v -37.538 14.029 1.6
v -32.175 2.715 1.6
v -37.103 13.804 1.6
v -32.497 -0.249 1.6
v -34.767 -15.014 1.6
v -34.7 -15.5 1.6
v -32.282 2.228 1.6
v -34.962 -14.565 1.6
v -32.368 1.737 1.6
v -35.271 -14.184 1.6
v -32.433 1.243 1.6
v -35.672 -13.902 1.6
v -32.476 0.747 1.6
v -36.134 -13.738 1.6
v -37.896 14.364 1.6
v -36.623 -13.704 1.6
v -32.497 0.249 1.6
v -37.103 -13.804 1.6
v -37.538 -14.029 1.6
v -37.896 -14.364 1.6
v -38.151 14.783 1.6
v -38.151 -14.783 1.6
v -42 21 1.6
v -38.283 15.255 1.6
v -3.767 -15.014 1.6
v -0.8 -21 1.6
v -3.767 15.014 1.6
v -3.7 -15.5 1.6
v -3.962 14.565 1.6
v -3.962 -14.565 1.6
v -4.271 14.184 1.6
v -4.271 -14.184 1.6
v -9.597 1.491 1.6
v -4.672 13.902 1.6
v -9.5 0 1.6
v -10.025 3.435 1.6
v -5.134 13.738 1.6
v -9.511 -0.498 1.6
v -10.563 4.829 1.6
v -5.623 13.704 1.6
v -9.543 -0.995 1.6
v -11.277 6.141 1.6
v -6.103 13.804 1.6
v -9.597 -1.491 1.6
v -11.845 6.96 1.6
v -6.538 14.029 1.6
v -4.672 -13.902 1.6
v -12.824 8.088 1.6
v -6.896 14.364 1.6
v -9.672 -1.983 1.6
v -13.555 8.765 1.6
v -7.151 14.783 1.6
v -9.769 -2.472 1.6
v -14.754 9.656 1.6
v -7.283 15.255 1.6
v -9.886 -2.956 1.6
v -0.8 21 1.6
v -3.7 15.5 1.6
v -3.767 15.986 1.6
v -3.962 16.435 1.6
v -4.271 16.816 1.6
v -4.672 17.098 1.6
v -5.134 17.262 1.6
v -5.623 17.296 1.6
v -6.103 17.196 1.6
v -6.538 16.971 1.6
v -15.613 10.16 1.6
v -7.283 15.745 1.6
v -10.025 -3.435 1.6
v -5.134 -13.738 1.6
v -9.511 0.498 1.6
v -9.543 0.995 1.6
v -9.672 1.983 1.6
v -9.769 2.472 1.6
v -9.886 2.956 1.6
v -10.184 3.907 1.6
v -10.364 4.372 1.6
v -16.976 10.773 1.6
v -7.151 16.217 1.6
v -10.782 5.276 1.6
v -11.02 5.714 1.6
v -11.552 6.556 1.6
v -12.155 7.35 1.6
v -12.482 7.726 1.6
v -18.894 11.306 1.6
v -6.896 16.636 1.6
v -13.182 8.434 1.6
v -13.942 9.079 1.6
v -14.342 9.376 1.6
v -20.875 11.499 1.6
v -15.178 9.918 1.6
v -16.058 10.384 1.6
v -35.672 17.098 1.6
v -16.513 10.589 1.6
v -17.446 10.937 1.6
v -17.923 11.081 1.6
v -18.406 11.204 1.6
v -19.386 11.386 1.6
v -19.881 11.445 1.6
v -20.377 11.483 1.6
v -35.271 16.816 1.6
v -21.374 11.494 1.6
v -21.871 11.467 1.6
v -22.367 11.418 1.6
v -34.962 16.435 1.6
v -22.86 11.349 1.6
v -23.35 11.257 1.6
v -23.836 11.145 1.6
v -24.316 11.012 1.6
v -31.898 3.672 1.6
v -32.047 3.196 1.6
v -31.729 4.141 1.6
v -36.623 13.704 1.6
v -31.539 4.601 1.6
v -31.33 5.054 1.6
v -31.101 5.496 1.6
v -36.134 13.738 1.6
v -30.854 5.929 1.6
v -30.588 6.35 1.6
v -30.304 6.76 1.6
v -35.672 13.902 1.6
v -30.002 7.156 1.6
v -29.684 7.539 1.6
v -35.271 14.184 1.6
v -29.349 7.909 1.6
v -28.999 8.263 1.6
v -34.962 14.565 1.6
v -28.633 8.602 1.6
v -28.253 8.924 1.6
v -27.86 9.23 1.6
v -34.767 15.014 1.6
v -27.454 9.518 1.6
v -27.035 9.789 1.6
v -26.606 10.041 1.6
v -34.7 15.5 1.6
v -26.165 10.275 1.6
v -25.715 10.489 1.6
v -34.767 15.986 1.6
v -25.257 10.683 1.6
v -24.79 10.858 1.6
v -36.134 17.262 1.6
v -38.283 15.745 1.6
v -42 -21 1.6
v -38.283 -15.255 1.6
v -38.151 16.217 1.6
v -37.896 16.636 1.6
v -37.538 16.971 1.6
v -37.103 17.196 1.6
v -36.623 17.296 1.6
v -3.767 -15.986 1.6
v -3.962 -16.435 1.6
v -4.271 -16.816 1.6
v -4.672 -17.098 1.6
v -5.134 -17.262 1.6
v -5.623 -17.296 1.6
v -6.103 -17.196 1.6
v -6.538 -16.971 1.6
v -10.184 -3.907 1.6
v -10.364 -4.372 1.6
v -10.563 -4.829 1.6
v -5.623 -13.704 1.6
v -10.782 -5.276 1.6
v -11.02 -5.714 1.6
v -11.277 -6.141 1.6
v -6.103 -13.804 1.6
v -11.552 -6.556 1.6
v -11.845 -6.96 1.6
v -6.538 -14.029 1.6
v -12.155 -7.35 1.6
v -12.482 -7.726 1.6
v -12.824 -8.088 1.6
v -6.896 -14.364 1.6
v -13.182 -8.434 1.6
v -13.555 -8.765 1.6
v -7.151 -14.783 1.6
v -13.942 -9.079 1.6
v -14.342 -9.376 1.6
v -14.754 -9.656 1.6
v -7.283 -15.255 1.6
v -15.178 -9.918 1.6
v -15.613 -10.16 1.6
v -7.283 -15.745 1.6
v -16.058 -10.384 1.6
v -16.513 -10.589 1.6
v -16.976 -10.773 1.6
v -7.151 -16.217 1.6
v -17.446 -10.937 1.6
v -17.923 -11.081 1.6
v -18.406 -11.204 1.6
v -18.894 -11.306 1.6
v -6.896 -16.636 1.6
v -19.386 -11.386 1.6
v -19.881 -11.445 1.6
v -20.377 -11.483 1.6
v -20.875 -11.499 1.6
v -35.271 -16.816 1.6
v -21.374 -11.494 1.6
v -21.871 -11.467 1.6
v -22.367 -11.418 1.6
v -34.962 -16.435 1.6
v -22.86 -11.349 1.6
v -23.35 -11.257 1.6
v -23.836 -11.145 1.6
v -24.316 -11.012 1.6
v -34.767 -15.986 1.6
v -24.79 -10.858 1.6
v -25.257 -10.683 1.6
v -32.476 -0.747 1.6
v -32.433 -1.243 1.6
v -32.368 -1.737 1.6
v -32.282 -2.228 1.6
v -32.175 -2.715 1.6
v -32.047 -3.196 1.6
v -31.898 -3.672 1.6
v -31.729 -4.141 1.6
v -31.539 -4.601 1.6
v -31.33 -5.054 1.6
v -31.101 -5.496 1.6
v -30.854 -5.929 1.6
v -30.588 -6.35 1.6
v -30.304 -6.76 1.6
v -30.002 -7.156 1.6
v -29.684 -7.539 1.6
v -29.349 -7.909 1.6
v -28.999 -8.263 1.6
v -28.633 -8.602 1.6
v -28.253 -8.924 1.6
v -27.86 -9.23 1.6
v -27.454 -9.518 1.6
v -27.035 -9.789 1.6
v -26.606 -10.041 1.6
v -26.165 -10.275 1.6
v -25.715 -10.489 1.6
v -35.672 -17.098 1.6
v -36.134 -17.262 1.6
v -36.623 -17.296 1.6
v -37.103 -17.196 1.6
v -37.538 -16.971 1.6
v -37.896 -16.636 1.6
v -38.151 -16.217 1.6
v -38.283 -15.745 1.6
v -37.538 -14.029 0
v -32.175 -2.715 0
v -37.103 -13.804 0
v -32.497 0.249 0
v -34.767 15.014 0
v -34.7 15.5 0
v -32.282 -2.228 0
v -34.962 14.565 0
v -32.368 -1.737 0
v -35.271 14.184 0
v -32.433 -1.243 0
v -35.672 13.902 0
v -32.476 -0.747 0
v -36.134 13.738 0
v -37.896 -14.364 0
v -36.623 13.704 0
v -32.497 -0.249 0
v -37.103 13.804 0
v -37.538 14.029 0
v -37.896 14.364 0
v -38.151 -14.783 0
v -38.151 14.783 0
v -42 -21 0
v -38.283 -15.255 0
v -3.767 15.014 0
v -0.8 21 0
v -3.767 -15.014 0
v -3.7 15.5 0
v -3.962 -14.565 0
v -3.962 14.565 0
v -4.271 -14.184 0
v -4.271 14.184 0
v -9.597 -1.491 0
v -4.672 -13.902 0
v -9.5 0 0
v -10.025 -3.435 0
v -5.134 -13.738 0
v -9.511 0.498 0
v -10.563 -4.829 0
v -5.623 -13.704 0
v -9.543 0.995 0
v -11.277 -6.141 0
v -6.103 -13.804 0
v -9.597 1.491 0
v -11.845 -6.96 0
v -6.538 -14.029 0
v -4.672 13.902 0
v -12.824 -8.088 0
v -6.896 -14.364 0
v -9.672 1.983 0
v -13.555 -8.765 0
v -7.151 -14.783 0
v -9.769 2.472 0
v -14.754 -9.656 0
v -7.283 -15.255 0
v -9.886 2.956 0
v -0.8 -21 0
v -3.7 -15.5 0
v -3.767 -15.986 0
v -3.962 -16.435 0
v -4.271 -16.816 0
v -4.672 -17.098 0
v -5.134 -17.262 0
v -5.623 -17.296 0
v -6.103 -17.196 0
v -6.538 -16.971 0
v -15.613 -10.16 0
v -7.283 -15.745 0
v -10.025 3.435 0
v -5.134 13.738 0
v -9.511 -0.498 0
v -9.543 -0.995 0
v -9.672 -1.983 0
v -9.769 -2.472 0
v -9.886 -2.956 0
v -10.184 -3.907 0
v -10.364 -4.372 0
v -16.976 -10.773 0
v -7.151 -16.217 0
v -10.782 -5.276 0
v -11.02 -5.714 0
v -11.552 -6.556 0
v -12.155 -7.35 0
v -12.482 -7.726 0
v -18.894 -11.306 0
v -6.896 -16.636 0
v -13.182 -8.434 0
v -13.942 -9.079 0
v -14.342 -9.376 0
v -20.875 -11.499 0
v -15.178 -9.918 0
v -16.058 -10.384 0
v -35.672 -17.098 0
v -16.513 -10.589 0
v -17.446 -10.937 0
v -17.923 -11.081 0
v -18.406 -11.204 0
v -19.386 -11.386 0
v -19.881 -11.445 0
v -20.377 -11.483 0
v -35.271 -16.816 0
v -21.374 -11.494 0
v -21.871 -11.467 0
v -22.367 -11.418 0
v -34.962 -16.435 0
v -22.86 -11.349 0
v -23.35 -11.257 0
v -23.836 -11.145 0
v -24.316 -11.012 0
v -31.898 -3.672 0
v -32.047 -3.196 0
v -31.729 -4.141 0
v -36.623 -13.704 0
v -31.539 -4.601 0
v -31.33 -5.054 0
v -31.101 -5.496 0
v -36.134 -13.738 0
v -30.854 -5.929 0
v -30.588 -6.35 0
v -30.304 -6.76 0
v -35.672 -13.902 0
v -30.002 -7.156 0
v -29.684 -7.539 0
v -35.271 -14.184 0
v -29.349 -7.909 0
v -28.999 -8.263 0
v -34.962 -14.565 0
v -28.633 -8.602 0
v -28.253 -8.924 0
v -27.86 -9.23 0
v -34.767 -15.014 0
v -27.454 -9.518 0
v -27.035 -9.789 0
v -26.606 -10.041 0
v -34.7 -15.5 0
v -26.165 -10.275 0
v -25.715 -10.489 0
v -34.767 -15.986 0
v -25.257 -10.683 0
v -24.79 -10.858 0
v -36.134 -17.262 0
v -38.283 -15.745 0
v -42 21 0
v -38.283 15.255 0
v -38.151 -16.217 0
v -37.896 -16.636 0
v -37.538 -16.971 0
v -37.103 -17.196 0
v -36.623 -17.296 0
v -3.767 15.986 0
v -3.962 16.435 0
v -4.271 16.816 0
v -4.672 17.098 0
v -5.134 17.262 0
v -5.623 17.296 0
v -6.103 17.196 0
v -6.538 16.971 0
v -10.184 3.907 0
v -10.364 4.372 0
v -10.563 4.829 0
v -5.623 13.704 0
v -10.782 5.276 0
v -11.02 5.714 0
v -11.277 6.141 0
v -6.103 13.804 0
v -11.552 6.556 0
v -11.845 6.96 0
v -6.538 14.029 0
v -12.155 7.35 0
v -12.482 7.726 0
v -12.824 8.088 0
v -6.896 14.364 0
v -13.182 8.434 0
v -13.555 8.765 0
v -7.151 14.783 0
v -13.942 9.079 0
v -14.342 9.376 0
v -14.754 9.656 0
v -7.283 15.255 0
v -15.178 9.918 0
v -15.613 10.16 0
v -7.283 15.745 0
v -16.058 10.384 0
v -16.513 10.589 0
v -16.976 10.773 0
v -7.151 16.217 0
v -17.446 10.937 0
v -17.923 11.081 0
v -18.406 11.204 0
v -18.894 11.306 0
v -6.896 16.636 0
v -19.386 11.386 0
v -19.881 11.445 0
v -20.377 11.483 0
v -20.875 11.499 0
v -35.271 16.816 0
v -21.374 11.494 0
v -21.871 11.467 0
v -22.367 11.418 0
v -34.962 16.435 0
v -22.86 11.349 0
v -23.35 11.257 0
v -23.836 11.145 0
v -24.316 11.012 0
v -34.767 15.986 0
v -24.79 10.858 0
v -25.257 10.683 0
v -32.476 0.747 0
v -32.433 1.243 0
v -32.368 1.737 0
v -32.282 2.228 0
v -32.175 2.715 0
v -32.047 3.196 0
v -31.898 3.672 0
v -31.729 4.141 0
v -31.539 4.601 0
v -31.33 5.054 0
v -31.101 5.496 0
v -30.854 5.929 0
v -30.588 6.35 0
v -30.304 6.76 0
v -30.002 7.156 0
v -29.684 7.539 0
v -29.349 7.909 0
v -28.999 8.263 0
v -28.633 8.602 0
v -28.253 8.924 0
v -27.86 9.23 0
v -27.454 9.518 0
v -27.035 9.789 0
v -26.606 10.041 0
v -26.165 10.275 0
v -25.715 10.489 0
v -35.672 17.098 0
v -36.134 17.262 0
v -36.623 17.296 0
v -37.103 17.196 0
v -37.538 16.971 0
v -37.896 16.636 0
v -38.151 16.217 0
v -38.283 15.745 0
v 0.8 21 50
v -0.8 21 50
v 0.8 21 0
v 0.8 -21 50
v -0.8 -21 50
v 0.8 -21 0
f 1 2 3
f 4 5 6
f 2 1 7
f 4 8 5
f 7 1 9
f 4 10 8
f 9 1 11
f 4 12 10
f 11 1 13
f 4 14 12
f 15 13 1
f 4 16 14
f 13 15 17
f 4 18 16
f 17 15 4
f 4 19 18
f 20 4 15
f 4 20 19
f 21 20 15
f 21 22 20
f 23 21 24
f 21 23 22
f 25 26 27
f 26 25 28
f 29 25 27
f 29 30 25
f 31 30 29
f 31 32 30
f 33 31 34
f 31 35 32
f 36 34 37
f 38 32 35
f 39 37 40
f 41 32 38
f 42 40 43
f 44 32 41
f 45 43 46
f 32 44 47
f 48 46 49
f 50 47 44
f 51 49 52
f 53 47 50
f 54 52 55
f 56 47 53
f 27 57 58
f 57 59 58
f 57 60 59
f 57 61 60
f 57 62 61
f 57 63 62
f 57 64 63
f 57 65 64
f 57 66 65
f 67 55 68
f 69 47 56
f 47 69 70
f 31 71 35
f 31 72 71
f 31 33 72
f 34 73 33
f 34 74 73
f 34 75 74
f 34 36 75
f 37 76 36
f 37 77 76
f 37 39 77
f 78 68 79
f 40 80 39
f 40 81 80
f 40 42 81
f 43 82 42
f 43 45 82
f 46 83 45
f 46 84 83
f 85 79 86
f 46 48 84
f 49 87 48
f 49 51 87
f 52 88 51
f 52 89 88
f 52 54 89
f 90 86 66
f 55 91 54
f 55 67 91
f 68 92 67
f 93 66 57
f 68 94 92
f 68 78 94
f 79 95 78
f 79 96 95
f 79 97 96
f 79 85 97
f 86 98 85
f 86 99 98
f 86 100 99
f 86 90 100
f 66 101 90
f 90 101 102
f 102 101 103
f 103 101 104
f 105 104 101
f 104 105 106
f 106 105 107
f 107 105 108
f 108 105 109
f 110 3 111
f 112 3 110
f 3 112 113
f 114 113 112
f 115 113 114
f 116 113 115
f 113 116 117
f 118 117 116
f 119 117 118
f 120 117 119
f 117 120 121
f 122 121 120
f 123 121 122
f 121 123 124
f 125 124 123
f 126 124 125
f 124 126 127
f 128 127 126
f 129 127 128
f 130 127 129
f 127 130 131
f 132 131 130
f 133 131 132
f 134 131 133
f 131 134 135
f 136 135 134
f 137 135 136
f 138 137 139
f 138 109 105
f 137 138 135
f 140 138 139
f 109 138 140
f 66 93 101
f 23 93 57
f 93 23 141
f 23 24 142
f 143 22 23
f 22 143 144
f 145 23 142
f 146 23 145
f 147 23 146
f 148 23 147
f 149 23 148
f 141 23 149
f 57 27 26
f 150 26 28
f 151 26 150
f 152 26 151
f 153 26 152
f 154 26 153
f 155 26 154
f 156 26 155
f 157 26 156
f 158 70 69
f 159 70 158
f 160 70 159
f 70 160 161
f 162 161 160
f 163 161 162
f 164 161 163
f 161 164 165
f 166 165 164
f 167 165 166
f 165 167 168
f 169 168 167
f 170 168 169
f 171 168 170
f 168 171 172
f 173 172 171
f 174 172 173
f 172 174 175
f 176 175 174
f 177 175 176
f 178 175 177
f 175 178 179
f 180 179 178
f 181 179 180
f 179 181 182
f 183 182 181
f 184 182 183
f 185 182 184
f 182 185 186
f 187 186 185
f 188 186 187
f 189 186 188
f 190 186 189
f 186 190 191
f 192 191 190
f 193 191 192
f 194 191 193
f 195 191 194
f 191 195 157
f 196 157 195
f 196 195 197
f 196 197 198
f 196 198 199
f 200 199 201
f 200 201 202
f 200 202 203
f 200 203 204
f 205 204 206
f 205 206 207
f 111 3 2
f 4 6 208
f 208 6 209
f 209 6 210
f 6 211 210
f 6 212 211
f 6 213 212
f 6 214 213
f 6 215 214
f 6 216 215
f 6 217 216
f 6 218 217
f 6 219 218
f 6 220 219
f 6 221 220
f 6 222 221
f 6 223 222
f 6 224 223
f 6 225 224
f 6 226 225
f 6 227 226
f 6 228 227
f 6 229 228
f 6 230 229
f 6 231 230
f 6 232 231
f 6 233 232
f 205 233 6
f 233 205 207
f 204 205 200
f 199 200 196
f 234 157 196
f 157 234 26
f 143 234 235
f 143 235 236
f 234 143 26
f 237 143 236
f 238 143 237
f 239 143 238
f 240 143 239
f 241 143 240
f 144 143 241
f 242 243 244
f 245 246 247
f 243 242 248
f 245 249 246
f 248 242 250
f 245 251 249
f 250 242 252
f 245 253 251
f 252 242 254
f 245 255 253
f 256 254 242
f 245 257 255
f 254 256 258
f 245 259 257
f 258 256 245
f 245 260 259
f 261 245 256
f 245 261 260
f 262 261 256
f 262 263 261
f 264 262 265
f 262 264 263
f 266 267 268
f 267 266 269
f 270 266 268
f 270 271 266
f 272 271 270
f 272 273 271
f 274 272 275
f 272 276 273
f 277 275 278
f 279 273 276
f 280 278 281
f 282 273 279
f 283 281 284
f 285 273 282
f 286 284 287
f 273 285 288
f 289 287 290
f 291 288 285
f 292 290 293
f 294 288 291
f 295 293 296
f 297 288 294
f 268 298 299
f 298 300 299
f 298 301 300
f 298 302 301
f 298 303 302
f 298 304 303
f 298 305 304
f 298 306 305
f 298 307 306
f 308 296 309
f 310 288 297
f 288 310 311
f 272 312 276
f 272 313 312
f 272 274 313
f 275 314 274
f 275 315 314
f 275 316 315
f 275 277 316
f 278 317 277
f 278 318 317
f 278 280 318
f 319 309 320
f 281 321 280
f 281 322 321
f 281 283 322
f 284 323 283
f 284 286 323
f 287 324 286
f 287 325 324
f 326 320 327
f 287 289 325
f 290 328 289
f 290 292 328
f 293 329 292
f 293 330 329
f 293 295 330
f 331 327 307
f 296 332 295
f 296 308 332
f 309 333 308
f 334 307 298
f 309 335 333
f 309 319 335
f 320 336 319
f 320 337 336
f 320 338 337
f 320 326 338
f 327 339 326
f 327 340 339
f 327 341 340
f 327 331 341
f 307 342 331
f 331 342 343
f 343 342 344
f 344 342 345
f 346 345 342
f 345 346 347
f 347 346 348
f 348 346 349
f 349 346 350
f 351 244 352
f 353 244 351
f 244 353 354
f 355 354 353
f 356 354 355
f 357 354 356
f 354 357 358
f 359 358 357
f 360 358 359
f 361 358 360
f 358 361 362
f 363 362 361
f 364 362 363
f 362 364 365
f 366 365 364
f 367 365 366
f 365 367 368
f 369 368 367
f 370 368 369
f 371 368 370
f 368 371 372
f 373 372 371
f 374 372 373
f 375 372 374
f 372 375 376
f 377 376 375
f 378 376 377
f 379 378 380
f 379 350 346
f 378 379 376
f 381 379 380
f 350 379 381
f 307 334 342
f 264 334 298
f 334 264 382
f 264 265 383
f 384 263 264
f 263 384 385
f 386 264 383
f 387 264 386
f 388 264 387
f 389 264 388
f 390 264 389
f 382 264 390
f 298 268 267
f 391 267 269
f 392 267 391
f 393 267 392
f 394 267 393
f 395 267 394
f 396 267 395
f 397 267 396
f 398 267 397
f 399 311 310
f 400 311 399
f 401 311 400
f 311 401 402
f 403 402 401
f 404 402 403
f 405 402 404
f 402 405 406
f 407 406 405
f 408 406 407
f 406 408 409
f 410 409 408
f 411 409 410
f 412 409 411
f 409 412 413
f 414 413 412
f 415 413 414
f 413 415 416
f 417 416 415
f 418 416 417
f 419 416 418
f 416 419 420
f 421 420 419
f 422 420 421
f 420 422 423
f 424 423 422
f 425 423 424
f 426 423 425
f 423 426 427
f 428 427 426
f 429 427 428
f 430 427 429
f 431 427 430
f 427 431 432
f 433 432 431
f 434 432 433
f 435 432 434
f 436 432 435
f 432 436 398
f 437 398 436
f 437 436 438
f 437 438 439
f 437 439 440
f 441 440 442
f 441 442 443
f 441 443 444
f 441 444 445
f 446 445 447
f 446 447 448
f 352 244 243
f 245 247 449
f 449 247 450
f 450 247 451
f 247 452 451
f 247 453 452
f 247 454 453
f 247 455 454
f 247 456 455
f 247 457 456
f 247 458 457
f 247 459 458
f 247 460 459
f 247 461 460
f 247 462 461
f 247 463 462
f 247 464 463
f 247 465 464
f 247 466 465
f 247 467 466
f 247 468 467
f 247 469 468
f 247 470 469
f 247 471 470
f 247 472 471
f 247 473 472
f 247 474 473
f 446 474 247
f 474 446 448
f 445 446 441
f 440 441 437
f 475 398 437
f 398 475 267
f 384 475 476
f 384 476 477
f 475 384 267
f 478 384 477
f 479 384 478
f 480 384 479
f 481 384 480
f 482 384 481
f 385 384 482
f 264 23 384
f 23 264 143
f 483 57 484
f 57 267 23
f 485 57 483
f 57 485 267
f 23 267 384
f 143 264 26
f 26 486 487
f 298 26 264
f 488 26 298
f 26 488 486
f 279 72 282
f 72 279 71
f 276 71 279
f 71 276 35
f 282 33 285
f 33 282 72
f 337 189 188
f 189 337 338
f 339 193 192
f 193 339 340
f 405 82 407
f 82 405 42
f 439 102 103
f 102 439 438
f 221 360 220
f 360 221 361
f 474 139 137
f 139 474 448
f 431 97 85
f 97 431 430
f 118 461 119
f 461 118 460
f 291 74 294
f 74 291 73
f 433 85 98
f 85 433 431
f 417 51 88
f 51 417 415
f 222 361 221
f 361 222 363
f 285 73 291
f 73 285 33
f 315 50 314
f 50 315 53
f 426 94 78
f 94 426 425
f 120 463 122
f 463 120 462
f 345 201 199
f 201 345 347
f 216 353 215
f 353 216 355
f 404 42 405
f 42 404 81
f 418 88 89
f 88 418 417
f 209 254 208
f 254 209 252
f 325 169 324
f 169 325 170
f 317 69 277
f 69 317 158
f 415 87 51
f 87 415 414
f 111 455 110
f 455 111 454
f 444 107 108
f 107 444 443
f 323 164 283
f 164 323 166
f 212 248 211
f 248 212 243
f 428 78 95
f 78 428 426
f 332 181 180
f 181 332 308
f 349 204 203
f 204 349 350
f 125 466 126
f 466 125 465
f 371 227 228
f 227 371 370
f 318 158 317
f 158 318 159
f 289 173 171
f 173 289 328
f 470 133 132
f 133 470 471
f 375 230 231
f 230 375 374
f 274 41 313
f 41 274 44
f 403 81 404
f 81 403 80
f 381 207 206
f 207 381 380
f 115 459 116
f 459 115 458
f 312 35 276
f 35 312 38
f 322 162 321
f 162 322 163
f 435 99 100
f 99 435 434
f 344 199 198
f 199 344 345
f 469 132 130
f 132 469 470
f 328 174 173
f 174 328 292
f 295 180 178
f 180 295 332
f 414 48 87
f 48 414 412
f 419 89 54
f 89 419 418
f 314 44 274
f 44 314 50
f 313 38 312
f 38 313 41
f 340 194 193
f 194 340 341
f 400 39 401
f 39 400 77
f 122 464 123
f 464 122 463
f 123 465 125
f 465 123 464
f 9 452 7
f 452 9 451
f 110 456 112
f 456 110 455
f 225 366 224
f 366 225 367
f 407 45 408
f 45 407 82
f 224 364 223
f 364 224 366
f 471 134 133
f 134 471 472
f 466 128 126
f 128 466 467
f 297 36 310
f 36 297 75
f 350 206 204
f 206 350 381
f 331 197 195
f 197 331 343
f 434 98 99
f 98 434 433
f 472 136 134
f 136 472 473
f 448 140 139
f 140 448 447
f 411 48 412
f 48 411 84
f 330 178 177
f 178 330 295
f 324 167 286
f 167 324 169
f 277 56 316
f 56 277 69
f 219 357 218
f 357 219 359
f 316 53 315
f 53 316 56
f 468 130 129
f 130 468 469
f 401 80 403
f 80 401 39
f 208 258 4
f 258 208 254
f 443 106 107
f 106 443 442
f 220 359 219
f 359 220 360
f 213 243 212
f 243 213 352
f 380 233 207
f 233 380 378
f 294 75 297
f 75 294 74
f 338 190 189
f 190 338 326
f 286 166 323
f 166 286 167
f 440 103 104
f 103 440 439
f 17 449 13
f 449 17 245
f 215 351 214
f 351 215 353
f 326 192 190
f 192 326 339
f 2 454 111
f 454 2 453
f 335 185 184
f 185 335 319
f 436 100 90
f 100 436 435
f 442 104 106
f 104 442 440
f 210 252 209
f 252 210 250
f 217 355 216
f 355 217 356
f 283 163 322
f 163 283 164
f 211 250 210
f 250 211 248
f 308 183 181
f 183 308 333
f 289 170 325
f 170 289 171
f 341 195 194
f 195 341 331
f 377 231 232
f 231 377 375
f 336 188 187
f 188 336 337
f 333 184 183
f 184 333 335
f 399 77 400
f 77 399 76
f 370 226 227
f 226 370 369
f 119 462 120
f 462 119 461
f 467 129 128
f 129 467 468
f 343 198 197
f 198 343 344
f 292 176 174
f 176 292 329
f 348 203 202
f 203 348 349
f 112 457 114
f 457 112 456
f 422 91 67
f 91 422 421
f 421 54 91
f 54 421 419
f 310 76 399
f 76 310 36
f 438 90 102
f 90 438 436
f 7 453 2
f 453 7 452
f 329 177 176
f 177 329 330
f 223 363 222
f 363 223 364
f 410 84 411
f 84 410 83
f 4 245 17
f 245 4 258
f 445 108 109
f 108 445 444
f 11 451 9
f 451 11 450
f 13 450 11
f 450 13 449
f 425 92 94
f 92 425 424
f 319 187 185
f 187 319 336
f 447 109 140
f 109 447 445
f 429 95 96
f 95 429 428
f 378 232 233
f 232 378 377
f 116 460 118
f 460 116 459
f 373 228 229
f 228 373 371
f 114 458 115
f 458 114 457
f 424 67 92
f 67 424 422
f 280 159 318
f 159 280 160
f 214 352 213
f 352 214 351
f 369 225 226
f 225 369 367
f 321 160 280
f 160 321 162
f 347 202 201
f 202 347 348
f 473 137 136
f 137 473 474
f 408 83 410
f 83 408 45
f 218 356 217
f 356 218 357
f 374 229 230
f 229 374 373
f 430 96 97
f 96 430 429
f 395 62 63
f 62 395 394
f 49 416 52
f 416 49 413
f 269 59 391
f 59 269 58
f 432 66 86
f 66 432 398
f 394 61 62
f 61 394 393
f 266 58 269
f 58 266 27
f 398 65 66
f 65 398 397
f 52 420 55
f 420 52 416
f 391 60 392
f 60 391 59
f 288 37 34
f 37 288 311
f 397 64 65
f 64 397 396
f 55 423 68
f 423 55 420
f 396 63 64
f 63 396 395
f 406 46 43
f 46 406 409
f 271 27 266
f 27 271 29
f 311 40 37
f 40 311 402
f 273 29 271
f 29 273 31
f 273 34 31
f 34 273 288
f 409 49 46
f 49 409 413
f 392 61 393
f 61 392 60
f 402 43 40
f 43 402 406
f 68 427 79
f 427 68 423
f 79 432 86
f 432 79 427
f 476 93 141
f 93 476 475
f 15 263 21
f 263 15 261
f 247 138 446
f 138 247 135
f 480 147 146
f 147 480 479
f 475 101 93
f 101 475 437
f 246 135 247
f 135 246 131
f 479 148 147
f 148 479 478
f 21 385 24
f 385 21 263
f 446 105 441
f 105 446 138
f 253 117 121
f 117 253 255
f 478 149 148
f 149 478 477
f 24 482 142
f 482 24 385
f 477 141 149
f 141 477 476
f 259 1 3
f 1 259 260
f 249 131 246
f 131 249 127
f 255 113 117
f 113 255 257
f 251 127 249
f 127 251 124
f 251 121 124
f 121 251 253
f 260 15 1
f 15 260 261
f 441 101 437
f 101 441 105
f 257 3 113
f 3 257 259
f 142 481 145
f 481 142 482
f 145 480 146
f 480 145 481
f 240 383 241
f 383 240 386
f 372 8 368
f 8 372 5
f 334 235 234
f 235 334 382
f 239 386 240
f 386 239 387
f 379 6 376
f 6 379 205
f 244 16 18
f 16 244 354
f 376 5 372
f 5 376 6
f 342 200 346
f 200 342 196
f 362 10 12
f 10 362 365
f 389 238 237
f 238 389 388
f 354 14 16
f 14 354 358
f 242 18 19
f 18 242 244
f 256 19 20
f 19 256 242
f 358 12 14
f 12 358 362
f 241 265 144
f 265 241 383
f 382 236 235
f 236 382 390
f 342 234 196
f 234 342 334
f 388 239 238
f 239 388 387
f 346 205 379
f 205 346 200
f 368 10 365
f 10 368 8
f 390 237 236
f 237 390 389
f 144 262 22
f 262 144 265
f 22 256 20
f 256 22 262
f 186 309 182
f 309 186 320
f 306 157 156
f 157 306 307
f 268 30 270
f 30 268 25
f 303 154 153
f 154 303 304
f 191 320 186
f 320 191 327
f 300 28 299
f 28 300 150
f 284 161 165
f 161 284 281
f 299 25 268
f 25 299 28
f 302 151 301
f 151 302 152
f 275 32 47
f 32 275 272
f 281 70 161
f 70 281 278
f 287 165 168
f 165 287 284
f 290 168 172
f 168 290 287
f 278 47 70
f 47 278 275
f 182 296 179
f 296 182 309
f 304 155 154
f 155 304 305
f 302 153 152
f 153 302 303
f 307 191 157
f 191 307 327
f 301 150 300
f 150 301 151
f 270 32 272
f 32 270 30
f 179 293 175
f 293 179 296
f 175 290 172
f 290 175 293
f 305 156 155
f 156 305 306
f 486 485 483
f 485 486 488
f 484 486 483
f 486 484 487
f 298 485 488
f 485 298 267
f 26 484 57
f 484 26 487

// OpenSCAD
//design and code by emanresu (http://www.thingiverse.com/Emanresu)
//generates clampable mounts for a NEMA 17 syle stepper motor



//CUSTOMIZER VARIABLES

//Clamp Type
type = "90 degree";//[90 degree, 180 degree, 45 degree, Multi]
//Clamp Thickness (mm)
thick = 1.6;
//Shaft height (mm)
shaft_height = 21;// 21:10000000
//width of clamp base (mm);
width=42; //42:10000000
//do you want the motor plate the same width as the clamp?
mount_flush="yes";//[yes,no]
//how do you want the motor mount justified with respect to the clamp?
//length of 90º base of clamp (mm)
base_1 = 50;
//length of 180º or 45º base of clamp (mm)
base_2 = 30;
//length of 180º base in multi-clamp (mm)
base_3 = 30;


/* [Hidden] */

//Sets openSCAD resolution for nice round holes
$fa=1;
$fs=0.5;

//NEMA 17 Parameters
Nema_square = 42;
Nema_hole_offset = 31;
Nema_mount_hole_diameter = 3.6;//clearance for M3 screws
Nema_center_hole_diameter = 23;

Nema_mount_hole_radius = Nema_mount_hole_diameter/2;
Nema_center_hole_radius = Nema_center_hole_diameter/2;


   ///////////////
  //  Modules  //
 ///////////////

module NEMA17_plate() {
	// Generates mounting plate  with the necessary clearance holes for a NEMA 17 style motor
	
	difference() {
		//plate body
		cube(size=[Nema_square, Nema_square, thick], center=true);
		
		//center hole
		cylinder(r=Nema_center_hole_radius, h=thick+2, center=true);
		
		//clearance holes for M3 screws
		translate([Nema_hole_offset/2, Nema_hole_offset/2, 0]) {
			cylinder(r=Nema_mount_hole_radius, h=thick+1, center=true);
		} 
		translate([-Nema_hole_offset/2, Nema_hole_offset/2, 0]) {
			cylinder(r=Nema_mount_hole_radius, h=thick+1, center=true);
		}
		translate([-Nema_hole_offset/2, -Nema_hole_offset/2, 0]) {
			cylinder(r=Nema_mount_hole_radius, h=thick+1, center=true);
		}
		translate([Nema_hole_offset/2, -Nema_hole_offset/2, 0]) {
			cylinder(r=Nema_mount_hole_radius, h=thick+1, center=true);
		}
	}
}


module 90deg_clamp() {
	// makes a simple 90º clamp for a NEMA 17 style motor
	
	//defines spacer for shaft_height parameter
	//sets minimum value allowed for shaft height
	delta = (shaft_height >= 21 ? abs(shaft_height-Nema_square/2) : 0);
	
	//sets minimum value allowed for the base width
	base_width = (width - Nema_square > 0 ? width : Nema_square);
	
	//determines if mount plate is flush with the rest of the clamp
	test_width = (mount_flush == "yes" ? (abs(width-Nema_square)/2) : 0);
	ex_width = (width-Nema_square > 0 ? test_width : 0);

	union() {
		//joining the parts of the clamp together
		translate([-21-delta, 0, thick/2]) {
			//positions motor mount
			NEMA17_plate();
		}
		translate([-delta/2, 0, thick/2]) {
			//spacer for motor height
			cube(size=[delta, 42, thick], center=true);
		}
		translate([-(42+delta)/2, 21+ex_width/2, thick/2]) {
			//wings for making plate flush
			cube(size=[42+delta, ex_width, thick], center=true);
		}
		translate([-(42+delta)/2, -21-ex_width/2, thick/2]) {
			//wings for making plate flush
			cube(size=[42+delta, ex_width, thick], center=true);
		}
		translate([0, 0, base_1/2]) {
			//90º clamp base
			cube(size=[thick, base_width, base_1], center=true);
		}
	}
}


module 180deg_clamp() {
	// makes a simple 180º clamp for a NEMA 17 style motor
	
	union() {
		//joins 90º clamp with an additional base to make the 180º clamp
		translate([-base_1-thick/2, 0, thick/2]) {
			rotate([0, 90, 0]) {
				//reorients the 90º clamp so the 180º clamp is printable
				90deg_clamp();
			}
		}
		translate([0, 0, base_2/2]) {
			//adding the 180º base to the clamp
			cube(size=[thick, width, base_2], center=true);
		}
	}	
}


module 45deg_clamp() {
	// makes a simple 45º clamp for a NEMA 17 style motor
	
	translate([0, 0, width/2]) rotate([-90, 0, 0]) {
		//Positions clamp for printing
		union() {
			//joins 90º clamp with an additional base to make the 45º clamp
			translate([-base_1, 0, thick/2]) {
				rotate([0, 90, 0]) {
					90deg_clamp();
				}
			}
			rotate([0, -45, 0]) {
				//adding the 45º base to the clamp
				translate([base_2/2, 0, thick/2]) {
					cube(size=[base_2, width, thick], center=true);
				}
			}	
		}
	}	
}


module Multi_clamp() {
	// makes a multi clamp (one with 45º, 90º and 180º clamping surfaces) for a NEMA 17 style motor
	
	beta = base_2*sin(45);
	
	union() {
		//joins a 45º clamp with an additional base to make the multi clamp
		45deg_clamp();

		translate([beta-thick, beta, 0]) {
			//adding the 180º base to the multi-clamp
			cube(size=[thick, base_3, width], center=false);
		}
	}	
}


   ////////////////////
  //  Control Code  //
 ////////////////////



if (type == "90 degree") {
	90deg_clamp();
}
if (type == "45 degree") {
	45deg_clamp();
}
if (type == "180 degree") {
	180deg_clamp();
}
if (type == "Multi") {
	Multi_clamp();
}
 
